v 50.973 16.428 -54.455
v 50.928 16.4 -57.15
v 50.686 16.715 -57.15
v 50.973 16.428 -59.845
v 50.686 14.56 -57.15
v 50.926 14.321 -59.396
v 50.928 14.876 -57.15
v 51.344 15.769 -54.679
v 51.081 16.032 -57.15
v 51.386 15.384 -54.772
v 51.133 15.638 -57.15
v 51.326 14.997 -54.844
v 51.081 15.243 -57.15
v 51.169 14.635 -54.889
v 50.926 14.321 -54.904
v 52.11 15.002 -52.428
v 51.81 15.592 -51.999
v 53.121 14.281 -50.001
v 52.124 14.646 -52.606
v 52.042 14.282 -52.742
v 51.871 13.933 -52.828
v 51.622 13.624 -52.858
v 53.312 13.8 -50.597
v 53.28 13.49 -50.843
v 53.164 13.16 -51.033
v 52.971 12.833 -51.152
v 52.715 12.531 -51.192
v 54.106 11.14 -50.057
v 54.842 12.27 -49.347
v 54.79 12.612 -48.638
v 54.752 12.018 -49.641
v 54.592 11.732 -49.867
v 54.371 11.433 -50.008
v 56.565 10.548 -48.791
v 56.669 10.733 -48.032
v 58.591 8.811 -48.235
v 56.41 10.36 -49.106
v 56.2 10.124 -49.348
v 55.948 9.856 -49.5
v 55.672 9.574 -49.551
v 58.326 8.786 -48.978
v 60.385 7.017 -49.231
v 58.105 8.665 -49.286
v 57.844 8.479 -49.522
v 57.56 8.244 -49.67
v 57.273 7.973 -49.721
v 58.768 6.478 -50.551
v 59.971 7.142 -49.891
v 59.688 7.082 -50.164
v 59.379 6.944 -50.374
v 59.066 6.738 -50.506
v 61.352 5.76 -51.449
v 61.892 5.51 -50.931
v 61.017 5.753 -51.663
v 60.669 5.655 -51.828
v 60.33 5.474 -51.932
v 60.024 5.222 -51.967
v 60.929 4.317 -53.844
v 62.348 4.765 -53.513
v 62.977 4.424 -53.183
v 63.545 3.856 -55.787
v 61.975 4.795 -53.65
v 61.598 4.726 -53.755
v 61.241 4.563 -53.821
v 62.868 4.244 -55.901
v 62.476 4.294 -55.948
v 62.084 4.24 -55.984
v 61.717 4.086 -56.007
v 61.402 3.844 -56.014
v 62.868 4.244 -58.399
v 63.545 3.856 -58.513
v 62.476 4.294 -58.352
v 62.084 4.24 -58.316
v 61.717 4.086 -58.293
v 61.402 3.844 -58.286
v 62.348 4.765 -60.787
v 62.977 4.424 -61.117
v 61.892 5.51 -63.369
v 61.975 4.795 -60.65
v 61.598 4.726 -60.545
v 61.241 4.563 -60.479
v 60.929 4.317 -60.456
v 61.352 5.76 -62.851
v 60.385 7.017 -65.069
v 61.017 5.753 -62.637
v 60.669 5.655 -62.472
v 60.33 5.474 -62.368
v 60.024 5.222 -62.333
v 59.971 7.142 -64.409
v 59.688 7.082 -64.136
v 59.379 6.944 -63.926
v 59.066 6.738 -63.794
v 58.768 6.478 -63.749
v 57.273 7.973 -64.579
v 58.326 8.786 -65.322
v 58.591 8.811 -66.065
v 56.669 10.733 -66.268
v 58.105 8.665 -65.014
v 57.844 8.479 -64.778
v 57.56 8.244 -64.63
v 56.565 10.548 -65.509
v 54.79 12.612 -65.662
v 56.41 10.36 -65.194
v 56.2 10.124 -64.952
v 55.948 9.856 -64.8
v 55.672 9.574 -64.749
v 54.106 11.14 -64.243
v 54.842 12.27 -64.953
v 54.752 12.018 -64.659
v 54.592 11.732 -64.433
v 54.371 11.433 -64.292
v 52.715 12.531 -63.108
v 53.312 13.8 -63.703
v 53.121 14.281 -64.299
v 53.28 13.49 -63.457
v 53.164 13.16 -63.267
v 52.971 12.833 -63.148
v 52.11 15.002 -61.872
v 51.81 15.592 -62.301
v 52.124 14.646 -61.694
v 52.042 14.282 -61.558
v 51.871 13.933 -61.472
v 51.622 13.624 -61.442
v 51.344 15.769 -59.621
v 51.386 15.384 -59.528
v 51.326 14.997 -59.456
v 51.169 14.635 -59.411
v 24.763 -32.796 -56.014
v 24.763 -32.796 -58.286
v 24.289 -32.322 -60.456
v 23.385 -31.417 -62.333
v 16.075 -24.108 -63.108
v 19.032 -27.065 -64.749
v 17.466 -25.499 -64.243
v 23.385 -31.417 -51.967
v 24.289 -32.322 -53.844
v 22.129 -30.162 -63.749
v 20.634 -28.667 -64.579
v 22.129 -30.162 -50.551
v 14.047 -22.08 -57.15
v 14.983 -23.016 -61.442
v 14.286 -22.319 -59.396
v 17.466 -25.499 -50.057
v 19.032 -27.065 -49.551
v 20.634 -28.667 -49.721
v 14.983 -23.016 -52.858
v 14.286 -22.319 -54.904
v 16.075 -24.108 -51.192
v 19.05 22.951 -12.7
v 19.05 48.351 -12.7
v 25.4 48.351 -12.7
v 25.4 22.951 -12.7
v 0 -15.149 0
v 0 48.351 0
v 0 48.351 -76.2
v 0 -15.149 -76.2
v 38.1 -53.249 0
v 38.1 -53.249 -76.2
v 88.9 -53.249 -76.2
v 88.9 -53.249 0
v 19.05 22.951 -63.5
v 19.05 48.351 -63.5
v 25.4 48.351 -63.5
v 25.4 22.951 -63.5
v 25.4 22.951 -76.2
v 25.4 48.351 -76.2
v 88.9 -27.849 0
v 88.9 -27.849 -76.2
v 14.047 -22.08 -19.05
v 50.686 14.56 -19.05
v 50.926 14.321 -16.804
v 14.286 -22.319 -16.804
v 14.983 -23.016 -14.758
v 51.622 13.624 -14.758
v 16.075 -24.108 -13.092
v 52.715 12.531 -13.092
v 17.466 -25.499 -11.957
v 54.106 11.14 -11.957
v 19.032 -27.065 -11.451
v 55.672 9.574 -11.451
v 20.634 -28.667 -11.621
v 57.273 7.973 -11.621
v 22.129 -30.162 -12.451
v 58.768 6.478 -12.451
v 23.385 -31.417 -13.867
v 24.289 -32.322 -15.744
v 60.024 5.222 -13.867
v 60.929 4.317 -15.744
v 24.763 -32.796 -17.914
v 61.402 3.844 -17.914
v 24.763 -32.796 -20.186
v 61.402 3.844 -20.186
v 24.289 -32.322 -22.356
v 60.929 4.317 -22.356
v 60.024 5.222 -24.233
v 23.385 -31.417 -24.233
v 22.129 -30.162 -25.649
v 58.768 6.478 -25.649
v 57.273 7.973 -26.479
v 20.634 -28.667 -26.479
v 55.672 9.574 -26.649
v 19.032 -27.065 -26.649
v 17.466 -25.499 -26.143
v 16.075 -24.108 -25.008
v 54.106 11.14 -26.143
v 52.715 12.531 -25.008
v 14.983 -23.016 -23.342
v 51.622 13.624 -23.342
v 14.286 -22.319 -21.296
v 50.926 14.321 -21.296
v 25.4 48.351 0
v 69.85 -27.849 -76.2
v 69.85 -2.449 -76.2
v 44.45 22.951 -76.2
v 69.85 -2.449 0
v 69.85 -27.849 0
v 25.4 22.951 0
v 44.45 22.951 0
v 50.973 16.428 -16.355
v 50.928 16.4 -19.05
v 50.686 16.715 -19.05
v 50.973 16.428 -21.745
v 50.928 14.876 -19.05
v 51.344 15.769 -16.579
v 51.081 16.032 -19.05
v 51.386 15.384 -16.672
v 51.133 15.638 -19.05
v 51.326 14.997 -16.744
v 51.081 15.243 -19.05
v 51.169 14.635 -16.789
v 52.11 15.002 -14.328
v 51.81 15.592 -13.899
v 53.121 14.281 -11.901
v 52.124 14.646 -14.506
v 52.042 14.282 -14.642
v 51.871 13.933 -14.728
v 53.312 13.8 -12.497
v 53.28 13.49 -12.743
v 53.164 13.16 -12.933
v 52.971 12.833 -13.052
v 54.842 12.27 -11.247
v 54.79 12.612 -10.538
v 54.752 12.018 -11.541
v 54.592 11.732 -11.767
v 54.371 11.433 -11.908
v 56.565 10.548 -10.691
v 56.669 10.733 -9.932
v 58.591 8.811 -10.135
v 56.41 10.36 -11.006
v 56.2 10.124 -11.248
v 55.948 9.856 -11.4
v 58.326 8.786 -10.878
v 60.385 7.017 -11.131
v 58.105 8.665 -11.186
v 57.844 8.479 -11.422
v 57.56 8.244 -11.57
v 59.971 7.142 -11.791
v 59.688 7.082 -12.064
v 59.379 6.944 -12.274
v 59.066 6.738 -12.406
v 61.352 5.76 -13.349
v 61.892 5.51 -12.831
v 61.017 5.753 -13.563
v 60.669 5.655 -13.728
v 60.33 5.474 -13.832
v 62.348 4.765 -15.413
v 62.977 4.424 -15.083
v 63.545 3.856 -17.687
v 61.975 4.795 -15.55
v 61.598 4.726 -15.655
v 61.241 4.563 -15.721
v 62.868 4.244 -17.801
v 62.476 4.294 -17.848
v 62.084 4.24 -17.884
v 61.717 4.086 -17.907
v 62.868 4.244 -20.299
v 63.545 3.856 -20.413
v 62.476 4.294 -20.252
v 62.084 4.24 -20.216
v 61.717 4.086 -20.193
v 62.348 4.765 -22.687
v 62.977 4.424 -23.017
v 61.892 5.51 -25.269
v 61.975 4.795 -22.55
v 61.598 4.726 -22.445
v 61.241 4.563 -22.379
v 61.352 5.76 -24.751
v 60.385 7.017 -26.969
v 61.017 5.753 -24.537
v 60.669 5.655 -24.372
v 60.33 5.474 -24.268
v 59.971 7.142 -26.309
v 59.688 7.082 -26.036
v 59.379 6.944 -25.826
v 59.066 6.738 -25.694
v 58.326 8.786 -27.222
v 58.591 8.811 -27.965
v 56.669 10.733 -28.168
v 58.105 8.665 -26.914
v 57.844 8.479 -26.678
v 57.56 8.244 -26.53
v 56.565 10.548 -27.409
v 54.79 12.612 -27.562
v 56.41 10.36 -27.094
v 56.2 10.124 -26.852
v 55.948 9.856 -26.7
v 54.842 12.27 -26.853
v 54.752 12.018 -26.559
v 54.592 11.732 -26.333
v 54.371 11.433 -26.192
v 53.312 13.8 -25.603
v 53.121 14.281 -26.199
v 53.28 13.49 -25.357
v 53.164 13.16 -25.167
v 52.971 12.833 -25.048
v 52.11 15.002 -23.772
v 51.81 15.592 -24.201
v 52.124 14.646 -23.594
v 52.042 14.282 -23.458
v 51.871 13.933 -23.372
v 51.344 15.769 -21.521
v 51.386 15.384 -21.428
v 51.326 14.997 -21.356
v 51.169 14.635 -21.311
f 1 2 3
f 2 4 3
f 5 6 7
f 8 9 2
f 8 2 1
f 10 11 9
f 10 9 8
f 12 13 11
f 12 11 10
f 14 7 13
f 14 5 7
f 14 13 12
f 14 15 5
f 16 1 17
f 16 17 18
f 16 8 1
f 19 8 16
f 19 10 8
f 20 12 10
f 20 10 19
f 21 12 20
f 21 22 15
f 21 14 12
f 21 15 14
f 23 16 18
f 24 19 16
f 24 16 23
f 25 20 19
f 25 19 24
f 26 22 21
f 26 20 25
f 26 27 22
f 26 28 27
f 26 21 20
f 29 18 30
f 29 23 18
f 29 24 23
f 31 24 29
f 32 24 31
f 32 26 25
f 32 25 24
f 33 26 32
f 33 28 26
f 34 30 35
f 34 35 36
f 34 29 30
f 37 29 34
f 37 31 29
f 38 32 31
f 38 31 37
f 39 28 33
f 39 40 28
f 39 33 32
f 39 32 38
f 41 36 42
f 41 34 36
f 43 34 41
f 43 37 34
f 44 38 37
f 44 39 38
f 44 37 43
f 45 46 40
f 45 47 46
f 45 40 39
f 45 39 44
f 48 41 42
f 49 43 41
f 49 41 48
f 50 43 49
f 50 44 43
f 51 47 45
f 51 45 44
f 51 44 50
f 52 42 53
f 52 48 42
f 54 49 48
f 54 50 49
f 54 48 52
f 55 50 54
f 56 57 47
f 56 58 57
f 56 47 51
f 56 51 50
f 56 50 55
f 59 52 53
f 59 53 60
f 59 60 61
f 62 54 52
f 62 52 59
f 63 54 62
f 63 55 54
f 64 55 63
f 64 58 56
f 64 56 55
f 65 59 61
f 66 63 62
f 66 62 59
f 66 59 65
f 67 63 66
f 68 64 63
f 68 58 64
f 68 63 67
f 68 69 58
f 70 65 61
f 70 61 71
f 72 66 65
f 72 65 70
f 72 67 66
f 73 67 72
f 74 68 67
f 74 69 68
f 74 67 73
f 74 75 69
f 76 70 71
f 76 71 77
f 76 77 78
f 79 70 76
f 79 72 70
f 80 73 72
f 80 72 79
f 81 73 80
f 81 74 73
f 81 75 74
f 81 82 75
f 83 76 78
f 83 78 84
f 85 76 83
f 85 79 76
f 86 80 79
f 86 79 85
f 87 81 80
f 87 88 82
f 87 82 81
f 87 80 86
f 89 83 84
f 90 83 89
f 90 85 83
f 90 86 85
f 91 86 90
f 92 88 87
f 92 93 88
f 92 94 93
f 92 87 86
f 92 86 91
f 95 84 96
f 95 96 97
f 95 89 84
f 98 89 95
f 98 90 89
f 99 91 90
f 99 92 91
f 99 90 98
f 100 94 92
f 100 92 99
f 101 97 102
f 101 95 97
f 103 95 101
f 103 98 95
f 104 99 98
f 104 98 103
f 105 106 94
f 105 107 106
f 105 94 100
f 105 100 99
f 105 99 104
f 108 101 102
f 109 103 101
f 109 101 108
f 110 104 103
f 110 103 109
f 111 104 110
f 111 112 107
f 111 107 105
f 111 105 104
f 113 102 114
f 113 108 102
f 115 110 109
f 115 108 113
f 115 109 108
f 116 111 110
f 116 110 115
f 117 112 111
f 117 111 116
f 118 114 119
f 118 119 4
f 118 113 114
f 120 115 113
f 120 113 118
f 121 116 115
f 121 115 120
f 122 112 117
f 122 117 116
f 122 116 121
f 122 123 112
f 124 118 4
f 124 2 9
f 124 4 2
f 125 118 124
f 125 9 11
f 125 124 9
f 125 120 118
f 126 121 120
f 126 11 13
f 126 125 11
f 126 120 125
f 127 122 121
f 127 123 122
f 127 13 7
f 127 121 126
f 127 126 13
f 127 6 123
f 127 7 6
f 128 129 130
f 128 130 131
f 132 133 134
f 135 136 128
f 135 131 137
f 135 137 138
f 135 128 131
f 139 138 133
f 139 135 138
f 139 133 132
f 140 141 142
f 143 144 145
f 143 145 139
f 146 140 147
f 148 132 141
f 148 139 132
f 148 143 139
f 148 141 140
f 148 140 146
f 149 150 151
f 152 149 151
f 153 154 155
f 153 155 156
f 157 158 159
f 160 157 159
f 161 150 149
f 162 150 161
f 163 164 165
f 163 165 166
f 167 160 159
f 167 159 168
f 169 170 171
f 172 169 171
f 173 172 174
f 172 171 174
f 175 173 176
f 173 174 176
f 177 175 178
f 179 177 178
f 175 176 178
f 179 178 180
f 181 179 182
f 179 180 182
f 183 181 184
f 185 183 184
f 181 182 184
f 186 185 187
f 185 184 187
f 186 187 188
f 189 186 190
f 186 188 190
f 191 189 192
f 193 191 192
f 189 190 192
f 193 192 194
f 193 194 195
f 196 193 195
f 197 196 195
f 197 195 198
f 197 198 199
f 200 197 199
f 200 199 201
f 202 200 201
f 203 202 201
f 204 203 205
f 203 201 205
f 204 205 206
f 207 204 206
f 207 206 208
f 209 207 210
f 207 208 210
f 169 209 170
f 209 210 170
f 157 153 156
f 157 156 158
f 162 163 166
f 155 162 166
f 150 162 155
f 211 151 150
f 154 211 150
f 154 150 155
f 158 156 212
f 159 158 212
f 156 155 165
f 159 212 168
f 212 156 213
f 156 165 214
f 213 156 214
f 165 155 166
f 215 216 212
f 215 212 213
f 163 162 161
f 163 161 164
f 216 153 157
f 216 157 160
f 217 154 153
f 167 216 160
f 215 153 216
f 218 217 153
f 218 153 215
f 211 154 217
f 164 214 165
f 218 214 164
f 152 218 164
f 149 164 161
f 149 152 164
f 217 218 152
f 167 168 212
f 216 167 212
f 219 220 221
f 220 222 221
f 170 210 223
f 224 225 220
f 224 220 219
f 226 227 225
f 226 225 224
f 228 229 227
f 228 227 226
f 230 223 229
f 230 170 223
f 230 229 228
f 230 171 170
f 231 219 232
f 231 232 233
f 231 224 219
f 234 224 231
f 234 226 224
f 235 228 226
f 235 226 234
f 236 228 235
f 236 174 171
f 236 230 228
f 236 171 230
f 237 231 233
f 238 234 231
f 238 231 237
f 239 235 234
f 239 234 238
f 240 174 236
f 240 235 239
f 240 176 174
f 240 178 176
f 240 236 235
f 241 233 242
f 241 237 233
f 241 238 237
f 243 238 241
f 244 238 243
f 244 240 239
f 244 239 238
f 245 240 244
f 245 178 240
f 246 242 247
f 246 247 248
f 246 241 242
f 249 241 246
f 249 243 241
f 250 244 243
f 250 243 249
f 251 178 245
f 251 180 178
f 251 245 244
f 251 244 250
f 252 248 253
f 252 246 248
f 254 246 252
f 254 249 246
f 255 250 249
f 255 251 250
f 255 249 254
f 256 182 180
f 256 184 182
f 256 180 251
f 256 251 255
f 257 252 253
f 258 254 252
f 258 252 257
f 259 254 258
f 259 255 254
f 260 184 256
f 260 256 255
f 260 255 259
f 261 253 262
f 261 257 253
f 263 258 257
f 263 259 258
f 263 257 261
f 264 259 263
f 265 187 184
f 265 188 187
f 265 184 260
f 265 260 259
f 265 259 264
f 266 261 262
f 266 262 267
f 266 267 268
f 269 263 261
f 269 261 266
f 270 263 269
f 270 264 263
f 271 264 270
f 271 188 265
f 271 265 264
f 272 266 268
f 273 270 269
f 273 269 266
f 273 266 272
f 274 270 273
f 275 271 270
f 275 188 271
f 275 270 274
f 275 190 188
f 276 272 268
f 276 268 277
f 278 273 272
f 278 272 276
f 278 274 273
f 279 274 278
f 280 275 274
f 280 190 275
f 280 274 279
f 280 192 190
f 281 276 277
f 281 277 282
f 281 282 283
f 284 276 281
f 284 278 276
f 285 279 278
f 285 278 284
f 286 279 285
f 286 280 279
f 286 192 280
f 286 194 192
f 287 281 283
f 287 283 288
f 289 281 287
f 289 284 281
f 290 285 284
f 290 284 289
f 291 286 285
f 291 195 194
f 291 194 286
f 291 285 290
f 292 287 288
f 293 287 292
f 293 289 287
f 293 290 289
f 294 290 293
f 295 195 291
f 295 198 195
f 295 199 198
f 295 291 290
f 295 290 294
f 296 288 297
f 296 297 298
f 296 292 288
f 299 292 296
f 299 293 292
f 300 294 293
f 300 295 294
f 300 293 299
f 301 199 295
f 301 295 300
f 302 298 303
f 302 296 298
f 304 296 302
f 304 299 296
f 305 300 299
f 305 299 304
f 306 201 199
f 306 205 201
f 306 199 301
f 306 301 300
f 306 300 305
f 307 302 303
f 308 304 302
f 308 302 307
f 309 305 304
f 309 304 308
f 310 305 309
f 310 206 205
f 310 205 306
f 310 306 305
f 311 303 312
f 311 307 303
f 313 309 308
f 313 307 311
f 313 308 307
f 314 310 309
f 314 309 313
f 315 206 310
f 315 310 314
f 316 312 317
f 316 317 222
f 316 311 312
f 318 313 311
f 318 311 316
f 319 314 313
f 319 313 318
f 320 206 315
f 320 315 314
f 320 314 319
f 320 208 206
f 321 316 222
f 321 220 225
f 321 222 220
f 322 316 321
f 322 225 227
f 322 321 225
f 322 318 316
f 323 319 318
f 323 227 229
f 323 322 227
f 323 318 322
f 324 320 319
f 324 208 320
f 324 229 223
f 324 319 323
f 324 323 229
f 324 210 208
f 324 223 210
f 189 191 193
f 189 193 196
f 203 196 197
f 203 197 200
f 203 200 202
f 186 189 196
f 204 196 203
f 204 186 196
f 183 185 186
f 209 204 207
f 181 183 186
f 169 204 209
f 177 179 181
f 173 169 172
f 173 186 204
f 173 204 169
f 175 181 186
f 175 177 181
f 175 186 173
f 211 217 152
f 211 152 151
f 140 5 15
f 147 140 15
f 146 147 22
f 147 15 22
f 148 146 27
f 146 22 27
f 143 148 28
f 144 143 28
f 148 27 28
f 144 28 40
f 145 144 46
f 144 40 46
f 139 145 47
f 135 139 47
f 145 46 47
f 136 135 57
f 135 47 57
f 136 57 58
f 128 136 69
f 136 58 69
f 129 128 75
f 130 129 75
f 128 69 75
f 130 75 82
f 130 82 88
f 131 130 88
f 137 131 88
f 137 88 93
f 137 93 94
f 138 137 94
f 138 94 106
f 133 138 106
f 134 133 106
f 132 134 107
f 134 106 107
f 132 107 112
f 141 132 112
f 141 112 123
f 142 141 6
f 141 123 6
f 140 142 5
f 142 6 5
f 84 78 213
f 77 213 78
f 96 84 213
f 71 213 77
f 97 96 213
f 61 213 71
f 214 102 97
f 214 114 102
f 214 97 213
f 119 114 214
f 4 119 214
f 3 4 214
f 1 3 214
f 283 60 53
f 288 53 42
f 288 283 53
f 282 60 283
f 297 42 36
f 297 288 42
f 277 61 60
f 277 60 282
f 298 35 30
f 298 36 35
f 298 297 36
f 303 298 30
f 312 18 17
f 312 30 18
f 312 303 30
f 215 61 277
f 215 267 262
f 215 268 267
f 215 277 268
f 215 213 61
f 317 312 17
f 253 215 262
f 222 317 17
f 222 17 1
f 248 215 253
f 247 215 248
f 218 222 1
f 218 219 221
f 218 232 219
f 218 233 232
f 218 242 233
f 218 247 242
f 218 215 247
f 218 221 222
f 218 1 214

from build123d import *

# Parameters (mm, degrees)
BOSS_EXTRUDE2_DEPTH = 76.2
SKETCH3_W           = 6.35
SKETCH3_H           = 50.8
CUT_EXTRUDE1_DEPTH  = 25.4
SKETCH4_R           = 7.62
CUT_EXTRUDE2_DEPTH  = 53.34
FILLET2_R           = 1.524


with BuildPart() as part:
    # Sketch2 → Boss-Extrude2 (new body)
    with BuildSketch(Plane.XY):
        Polygon((0, 48.351318045), (0, -15.148681955), (38.1, -53.248681955), (88.9, -53.248681955), (88.9, -27.848681955), (69.85, -27.848681955), (69.85, -2.448681955), (44.45, 22.951318045), (25.4, 22.951318045), (25.4, 48.351318045), align=None)
    extrude(amount=-BOSS_EXTRUDE2_DEPTH)

    # Sketch3 → Cut-Extrude1 (cut)
    with BuildSketch(Plane(origin=(0, 48.351318045, 0), x_dir=(1, 0, 0), z_dir=(0, 1, 0))):
        with Locations((22.225, 38.1)):
            Rectangle(SKETCH3_W, SKETCH3_H)
    extrude(amount=-CUT_EXTRUDE1_DEPTH, mode=Mode.SUBTRACT)

    # Sketch4 → Cut-Extrude2 (cut)
    with BuildSketch(Plane(origin=(33.700659023, 33.700659023, 0), x_dir=(0, 0, -1), z_dir=(0.7071067811865488, 0.7071067811865462, 0))):
        with Locations(Location((19.05, -33.165088281, 0), (0, 0, 90))):
            Circle(SKETCH4_R)
        with Locations(Location((57.15, -33.165088281, 0), (0, 0, 90))):
            Circle(SKETCH4_R)
    extrude(amount=-CUT_EXTRUDE2_DEPTH, mode=Mode.SUBTRACT)

    # Fillet2
    fillet2_edges = [part.edges().sort_by_distance(p)[0] for p in [
        (62.540071517, 4.861246528, -19.05),
        (62.540071517, 4.861246528, -57.15),
    ]]
    fillet(fillet2_edges, radius=FILLET2_R)


solid = part.part
